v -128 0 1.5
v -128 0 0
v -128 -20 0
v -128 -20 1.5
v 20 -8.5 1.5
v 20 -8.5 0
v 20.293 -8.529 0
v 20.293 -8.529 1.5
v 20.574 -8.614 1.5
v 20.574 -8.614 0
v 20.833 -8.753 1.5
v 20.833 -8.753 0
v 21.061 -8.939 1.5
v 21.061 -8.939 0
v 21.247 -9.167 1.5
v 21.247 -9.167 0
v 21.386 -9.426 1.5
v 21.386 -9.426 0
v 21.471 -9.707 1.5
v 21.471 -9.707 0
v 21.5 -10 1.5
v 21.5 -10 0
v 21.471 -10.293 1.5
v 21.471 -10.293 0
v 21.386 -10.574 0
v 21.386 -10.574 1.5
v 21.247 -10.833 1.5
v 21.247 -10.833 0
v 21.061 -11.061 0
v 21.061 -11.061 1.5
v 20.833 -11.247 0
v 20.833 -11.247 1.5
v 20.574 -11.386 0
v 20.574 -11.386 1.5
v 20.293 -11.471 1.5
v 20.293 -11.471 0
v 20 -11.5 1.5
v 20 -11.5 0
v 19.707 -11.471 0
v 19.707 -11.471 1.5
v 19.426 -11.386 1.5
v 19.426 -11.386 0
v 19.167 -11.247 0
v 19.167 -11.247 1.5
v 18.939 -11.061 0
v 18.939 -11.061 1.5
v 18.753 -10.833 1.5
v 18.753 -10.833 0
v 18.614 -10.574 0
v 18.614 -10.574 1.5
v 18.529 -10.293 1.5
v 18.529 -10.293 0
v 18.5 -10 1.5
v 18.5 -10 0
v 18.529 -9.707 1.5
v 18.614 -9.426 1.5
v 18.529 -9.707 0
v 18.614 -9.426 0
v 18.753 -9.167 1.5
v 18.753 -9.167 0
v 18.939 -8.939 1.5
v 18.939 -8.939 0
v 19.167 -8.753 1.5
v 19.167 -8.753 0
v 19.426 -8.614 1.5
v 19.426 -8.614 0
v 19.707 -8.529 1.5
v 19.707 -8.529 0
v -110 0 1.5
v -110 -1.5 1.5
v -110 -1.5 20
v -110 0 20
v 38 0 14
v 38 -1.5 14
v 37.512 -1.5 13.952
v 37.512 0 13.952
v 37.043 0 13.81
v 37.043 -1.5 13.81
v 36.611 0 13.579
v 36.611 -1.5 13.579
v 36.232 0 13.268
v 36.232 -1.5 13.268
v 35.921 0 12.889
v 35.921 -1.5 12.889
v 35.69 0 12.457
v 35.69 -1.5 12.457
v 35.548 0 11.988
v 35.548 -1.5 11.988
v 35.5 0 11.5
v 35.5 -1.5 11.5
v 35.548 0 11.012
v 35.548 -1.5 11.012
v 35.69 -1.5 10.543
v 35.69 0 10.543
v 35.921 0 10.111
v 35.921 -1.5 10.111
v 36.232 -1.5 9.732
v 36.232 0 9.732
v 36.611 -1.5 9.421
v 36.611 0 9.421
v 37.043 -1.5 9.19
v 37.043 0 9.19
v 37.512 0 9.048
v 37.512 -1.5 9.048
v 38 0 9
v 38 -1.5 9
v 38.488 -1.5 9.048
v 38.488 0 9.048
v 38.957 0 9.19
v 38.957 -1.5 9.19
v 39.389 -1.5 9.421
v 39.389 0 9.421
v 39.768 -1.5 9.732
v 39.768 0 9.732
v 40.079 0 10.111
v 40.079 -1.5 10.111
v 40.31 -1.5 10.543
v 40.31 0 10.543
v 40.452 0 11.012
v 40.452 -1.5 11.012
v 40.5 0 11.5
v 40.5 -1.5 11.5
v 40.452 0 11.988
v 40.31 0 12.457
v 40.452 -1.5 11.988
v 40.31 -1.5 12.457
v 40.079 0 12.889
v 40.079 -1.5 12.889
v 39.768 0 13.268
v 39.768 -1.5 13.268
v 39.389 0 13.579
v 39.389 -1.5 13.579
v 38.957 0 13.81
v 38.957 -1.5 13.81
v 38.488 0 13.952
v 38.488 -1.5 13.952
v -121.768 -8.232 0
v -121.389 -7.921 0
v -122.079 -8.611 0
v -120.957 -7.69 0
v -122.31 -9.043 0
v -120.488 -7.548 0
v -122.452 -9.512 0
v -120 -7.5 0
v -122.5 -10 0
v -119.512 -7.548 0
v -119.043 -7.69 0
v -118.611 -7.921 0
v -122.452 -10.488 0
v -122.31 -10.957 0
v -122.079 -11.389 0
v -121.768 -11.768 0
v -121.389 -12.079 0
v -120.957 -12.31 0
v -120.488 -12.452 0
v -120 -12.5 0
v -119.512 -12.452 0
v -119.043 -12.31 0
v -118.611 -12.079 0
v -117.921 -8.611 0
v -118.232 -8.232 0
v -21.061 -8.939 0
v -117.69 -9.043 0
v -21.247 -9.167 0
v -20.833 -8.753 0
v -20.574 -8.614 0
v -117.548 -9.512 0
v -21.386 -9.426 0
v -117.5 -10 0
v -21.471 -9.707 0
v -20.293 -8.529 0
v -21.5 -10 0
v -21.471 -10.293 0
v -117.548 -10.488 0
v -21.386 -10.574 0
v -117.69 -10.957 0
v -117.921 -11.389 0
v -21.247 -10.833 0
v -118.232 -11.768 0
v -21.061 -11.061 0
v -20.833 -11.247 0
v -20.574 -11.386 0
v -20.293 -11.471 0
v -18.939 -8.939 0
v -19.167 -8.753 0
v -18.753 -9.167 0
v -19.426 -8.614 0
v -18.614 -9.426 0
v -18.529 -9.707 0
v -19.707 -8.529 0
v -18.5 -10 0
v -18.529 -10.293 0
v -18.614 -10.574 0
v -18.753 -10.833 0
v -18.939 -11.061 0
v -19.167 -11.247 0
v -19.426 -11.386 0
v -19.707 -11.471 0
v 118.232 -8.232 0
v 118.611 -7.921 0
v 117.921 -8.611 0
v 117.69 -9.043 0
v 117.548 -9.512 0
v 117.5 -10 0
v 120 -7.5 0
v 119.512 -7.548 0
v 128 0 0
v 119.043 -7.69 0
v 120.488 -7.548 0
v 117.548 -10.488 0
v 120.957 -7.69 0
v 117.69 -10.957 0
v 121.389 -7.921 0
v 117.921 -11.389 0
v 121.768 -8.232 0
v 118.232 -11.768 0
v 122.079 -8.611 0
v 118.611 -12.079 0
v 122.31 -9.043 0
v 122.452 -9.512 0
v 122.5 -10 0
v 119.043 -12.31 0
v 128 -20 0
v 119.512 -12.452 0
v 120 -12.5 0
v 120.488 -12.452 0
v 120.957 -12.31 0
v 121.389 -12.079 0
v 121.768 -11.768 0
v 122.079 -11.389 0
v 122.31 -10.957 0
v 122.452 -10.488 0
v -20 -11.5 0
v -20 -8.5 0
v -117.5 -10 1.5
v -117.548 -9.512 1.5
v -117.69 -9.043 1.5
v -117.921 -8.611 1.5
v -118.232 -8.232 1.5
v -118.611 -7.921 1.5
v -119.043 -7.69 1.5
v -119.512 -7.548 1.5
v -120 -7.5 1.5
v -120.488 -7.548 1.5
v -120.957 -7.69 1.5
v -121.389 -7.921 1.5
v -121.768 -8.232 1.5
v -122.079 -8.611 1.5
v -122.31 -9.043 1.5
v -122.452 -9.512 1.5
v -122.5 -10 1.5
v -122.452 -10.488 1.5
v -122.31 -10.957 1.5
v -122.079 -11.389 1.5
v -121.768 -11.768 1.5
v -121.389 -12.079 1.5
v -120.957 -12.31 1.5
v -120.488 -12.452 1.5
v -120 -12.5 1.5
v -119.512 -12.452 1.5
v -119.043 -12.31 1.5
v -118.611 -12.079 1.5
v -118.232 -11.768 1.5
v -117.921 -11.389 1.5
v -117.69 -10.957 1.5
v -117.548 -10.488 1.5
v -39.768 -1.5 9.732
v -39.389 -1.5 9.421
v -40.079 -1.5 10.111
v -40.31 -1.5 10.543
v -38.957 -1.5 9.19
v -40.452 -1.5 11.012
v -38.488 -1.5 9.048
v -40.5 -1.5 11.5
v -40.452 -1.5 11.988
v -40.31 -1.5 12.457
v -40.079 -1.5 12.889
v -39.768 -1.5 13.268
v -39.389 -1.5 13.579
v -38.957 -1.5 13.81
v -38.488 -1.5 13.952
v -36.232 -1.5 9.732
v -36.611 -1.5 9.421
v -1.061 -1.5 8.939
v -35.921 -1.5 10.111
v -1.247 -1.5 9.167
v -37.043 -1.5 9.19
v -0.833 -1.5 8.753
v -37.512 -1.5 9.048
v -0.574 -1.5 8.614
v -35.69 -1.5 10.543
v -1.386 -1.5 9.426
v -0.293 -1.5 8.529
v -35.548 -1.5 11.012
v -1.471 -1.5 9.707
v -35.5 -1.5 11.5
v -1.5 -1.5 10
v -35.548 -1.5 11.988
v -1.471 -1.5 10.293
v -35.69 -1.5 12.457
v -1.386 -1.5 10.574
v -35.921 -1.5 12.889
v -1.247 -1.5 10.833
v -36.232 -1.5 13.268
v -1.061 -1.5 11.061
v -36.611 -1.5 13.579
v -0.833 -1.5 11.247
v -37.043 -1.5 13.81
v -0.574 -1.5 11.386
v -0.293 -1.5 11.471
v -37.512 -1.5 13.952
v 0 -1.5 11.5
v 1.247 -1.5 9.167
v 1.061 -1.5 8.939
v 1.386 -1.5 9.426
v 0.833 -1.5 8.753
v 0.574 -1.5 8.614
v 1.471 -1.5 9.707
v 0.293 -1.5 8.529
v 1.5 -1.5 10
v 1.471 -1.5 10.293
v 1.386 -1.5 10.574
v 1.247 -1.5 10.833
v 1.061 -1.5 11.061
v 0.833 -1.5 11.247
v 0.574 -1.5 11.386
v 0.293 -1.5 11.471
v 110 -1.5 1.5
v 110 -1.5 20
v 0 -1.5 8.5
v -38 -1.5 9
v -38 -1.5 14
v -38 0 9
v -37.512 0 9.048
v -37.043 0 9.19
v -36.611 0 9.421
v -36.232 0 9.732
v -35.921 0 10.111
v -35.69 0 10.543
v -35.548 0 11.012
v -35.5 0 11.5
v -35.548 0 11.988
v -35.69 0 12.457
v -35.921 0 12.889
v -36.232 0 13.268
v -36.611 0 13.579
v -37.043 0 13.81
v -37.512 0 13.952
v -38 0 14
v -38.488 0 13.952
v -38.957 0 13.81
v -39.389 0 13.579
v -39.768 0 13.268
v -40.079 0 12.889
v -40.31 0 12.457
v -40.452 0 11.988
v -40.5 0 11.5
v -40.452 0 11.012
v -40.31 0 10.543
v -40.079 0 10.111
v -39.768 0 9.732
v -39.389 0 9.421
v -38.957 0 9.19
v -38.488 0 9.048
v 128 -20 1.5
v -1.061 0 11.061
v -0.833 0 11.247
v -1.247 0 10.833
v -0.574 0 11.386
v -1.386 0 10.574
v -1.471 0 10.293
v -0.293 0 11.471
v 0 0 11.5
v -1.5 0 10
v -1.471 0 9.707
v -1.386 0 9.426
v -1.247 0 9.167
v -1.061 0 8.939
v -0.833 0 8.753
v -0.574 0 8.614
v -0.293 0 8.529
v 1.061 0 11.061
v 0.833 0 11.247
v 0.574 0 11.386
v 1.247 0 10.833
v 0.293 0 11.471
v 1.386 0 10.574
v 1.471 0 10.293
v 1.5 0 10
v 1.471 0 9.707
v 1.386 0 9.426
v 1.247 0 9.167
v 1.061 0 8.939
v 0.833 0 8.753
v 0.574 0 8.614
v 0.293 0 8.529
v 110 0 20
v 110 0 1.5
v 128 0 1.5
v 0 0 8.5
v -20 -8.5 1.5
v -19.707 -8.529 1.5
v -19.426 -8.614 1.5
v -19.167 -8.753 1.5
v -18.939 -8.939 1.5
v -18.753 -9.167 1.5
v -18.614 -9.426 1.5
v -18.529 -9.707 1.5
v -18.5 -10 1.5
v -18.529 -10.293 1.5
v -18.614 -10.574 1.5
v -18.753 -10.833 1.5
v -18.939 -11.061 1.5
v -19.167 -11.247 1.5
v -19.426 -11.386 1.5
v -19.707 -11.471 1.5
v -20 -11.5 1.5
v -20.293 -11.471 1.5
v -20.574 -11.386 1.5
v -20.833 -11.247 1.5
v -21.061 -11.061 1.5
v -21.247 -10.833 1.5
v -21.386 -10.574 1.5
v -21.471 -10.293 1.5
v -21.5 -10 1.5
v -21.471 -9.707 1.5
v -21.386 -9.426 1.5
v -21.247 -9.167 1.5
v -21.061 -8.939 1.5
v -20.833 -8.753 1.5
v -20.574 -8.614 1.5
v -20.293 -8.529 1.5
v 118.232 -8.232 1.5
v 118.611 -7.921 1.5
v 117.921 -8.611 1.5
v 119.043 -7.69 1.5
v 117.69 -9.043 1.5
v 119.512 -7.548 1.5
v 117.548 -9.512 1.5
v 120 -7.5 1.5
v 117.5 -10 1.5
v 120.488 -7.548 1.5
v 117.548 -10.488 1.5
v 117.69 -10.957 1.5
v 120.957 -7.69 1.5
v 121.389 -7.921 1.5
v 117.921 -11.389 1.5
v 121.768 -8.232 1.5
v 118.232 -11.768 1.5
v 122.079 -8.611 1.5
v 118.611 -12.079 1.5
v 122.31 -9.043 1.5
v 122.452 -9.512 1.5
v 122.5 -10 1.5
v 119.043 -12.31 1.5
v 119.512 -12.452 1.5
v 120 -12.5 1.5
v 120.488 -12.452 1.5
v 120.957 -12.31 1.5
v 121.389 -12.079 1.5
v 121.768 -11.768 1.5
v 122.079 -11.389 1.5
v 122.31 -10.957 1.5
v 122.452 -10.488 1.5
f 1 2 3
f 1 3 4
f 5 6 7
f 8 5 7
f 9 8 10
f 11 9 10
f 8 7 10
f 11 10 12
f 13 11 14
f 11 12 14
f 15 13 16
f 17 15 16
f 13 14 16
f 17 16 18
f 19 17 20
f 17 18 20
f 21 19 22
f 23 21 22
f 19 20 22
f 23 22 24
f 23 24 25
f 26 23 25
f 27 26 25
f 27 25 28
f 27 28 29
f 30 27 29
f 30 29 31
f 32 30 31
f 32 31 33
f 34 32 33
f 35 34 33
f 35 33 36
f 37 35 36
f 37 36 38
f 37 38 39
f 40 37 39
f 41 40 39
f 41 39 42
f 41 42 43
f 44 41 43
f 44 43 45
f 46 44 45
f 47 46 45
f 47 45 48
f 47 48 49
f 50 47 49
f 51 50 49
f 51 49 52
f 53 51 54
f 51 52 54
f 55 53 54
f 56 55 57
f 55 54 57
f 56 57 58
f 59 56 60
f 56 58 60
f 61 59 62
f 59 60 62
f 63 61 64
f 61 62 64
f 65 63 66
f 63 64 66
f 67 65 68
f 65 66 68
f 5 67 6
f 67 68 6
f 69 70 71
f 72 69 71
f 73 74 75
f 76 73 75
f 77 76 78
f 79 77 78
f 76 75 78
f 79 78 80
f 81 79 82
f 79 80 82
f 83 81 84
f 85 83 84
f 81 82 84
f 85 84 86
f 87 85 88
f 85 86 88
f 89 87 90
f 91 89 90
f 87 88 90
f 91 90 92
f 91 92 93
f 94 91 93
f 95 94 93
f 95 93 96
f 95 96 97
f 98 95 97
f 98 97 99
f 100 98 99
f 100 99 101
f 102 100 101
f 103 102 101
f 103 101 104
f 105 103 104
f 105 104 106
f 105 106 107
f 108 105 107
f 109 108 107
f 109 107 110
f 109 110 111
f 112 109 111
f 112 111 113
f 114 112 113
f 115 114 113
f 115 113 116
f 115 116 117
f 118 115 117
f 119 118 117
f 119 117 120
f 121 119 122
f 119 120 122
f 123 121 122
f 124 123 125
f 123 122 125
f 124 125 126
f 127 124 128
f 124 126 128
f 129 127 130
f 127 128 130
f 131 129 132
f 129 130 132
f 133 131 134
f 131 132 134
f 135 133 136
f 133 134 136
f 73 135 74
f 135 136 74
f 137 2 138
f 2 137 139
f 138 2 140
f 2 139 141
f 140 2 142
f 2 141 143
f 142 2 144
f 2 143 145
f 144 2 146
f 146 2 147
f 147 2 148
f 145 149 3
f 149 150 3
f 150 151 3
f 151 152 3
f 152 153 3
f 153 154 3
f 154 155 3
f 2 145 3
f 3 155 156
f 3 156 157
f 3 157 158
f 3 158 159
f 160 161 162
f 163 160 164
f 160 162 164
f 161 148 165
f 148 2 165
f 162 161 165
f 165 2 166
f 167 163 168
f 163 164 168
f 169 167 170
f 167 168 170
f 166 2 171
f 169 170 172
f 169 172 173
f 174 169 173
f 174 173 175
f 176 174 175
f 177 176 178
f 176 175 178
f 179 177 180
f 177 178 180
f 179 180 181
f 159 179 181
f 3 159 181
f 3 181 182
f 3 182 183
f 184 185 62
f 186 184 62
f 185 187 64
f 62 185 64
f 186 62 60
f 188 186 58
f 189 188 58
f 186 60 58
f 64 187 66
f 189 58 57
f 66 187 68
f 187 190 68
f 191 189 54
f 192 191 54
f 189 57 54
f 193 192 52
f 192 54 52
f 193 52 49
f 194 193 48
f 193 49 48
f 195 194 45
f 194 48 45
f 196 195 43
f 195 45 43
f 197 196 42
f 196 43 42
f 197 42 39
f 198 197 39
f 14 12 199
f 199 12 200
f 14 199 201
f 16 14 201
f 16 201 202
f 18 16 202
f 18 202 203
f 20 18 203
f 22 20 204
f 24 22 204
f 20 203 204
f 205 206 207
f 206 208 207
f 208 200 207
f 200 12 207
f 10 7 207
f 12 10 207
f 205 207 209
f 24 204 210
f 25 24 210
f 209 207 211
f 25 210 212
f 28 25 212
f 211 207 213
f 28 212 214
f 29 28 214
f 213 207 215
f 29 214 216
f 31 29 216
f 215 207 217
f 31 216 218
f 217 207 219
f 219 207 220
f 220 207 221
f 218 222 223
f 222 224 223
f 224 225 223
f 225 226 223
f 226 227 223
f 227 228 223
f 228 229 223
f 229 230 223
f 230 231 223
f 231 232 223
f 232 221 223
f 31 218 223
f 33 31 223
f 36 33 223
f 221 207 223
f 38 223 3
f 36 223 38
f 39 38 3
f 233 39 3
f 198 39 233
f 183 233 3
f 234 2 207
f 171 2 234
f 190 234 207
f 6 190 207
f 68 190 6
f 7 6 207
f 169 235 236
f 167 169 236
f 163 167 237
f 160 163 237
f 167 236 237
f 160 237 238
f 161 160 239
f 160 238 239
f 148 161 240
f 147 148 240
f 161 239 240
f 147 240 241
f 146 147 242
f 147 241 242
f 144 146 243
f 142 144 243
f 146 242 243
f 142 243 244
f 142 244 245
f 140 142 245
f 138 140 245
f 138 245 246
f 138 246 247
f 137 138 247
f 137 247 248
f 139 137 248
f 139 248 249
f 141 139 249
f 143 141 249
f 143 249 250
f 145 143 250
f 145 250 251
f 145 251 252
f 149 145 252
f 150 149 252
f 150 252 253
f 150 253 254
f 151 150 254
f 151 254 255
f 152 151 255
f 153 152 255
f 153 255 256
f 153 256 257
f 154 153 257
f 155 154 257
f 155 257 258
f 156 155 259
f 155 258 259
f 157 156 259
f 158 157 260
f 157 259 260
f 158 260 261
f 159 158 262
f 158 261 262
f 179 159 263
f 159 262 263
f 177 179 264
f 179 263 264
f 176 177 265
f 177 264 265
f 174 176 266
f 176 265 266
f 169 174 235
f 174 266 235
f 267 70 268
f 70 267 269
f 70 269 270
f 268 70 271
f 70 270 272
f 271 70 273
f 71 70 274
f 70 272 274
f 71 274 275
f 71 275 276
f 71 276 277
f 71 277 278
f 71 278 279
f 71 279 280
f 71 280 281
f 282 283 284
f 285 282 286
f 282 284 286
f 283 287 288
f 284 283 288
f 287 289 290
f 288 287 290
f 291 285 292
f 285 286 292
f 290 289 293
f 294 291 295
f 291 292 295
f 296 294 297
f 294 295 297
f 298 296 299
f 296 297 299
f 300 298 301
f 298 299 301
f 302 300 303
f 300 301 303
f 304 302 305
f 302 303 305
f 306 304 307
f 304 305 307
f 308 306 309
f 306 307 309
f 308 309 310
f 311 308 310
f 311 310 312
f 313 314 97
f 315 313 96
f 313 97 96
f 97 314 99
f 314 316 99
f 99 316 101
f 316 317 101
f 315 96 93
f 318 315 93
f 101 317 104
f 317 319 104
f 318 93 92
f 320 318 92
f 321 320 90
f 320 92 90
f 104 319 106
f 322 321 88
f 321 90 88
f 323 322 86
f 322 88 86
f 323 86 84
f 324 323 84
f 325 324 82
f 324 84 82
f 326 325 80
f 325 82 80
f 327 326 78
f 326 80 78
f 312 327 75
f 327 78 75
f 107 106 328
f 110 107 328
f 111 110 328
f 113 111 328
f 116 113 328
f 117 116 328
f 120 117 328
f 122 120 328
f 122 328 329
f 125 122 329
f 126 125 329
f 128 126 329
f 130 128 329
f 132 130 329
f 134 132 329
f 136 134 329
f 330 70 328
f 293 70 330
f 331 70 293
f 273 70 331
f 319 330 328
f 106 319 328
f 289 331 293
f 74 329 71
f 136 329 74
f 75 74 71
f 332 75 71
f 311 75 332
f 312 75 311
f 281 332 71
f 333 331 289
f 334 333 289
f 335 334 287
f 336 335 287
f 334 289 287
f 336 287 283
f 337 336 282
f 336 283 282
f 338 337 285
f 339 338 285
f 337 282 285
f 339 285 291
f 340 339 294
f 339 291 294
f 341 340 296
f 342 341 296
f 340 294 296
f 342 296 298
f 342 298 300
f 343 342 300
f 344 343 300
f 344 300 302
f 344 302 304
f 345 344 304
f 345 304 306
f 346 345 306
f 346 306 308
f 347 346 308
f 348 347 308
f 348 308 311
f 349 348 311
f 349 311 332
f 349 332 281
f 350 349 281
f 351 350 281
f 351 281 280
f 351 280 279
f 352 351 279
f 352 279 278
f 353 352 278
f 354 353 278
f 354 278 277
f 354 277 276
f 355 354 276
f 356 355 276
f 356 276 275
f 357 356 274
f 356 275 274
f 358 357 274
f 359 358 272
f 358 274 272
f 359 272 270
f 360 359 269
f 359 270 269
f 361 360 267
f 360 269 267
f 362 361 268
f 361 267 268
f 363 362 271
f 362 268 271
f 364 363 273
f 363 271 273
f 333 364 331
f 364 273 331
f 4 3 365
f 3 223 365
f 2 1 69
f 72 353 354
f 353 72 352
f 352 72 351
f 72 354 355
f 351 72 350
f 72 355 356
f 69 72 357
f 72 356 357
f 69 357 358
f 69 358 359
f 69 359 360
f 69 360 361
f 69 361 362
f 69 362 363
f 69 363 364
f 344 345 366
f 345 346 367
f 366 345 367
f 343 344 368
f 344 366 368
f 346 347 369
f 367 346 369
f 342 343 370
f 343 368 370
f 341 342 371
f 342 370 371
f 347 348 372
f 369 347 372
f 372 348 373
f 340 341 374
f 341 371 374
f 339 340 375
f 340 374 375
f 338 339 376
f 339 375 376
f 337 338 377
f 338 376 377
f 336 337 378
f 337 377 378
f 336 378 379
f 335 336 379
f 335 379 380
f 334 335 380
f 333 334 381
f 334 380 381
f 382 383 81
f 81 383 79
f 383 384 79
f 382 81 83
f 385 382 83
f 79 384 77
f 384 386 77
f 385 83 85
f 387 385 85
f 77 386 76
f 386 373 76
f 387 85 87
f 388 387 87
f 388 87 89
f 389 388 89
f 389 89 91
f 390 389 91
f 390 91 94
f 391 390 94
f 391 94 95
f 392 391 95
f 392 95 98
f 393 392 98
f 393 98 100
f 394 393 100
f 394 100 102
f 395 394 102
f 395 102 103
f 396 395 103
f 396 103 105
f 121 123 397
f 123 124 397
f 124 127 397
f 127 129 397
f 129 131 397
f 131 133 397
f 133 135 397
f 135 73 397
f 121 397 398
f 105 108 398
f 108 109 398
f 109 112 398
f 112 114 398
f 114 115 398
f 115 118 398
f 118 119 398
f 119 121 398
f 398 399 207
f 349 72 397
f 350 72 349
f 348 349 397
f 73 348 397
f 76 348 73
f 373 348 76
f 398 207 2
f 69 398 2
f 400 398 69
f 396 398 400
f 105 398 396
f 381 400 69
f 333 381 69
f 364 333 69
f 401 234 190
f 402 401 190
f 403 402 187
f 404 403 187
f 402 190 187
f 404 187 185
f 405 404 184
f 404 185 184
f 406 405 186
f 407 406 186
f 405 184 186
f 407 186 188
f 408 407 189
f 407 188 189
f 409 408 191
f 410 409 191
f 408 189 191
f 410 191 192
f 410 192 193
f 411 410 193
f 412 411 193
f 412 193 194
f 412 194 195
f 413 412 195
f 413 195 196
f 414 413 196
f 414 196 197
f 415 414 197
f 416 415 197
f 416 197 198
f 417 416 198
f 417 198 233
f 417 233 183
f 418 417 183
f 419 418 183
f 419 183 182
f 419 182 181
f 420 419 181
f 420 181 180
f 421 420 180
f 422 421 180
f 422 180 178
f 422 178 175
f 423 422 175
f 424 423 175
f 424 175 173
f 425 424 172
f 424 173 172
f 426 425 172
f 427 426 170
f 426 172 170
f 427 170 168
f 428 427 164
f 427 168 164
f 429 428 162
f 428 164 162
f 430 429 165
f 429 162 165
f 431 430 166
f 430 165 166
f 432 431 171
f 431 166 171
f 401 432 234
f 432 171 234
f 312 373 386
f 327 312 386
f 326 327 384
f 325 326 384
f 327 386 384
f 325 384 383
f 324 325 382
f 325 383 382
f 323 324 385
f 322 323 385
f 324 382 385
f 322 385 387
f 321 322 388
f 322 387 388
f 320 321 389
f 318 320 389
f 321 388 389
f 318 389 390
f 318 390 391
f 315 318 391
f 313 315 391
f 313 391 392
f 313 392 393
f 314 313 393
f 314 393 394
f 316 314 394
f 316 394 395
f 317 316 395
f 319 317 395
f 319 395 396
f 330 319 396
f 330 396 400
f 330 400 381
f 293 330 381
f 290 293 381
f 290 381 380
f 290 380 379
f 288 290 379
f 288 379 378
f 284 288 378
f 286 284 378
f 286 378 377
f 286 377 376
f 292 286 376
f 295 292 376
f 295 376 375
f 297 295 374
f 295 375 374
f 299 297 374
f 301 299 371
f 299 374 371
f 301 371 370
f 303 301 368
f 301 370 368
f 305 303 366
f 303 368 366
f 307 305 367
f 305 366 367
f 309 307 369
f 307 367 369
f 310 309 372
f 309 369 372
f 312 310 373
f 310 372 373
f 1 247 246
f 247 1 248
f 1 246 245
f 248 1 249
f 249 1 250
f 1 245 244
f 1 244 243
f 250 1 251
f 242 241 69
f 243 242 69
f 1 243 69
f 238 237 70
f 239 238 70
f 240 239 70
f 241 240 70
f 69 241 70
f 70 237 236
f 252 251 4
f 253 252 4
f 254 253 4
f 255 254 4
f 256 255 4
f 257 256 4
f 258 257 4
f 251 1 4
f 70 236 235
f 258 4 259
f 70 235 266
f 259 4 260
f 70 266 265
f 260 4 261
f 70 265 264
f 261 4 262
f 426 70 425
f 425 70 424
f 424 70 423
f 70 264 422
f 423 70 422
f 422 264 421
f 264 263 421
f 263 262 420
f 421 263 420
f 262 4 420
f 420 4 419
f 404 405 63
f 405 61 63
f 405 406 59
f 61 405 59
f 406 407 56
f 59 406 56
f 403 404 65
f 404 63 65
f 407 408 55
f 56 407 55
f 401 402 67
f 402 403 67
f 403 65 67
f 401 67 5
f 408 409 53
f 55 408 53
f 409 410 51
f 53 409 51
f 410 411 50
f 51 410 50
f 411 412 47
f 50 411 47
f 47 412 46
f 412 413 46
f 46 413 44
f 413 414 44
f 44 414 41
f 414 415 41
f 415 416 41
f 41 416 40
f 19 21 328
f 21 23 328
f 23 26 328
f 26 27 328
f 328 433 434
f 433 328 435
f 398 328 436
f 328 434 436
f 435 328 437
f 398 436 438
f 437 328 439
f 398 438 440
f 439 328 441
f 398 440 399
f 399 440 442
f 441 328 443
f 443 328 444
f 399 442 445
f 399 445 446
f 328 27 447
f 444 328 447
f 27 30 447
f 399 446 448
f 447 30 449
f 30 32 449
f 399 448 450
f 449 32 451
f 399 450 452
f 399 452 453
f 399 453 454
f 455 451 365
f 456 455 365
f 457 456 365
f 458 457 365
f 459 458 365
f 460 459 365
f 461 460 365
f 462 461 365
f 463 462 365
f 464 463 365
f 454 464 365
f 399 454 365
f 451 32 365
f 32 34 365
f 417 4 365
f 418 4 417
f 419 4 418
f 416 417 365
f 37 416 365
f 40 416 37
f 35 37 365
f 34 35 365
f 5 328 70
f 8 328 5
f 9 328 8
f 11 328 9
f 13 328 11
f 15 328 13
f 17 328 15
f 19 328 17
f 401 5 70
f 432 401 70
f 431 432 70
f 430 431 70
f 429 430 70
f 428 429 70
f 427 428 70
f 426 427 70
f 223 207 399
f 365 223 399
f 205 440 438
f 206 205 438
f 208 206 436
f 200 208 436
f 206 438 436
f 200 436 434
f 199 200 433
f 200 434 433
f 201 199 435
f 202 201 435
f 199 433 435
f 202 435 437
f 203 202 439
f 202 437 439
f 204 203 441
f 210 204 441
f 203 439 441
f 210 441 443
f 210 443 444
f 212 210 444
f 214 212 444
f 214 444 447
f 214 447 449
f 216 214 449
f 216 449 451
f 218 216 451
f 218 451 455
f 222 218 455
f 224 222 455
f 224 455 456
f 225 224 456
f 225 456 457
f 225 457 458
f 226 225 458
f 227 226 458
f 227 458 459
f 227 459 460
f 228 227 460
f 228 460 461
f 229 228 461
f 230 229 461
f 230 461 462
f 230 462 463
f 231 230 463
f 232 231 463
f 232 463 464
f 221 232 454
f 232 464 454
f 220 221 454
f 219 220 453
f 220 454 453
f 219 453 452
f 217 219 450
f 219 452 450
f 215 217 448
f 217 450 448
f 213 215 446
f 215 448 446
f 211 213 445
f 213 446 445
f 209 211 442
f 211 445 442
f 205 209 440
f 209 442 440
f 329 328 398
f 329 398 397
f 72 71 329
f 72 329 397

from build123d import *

# Parameters (mm, degrees)
EXTRU_MINCE1_DEPTH      = 128
ESQUISSE2_R             = 2.5
ENL_V_MAT_EXTRU_1_DEPTH = 10
ESQUISSE3_R             = 2.5
ESQUISSE3_W             = 18
ESQUISSE3_H             = 18.5
ENL_V_MAT_EXTRU_2_DEPTH = 10
ESQUISSE4_R             = 1.5
ENL_V_MAT_EXTRU_3_DEPTH = 5
ESQUISSE5_R             = 1.5
ENL_V_MAT_EXTRU_4_DEPTH = 5


with BuildPart() as part:
    # Esquisse1 → Extru.-Mince1 (new, symmetric)
    with BuildSketch(Plane(origin=(0, 0, 0), x_dir=(0, 0, -1), z_dir=(1, 0, 0))):
        Polygon((-20, 0), (0, 0), (0, -20), (-1.5, -20), (-1.5, -1.5), (-20, -1.5), align=None)
    extrude(amount=EXTRU_MINCE1_DEPTH, both=True)

    # Esquisse2 → Enlèv. mat.-Extru.1 (cut)
    with BuildSketch(Plane.XY.offset(1.5)):
        with Locations((-120, -10)):
            Circle(ESQUISSE2_R)
        with Locations(Location((120, -10, 0), (0, 0, 90))):
            Circle(ESQUISSE2_R)
    extrude(amount=-ENL_V_MAT_EXTRU_1_DEPTH, mode=Mode.SUBTRACT)

    # Esquisse3 → Enlèv. mat.-Extru.2 (cut)
    with BuildSketch(Plane.XZ.offset(1.5)):
        with Locations(Location((-38, 11.5, 0), (0, 0, 270))):
            Circle(ESQUISSE3_R)
        with Locations(Location((38, 11.5, 0), (0, 0, 90))):
            Circle(ESQUISSE3_R)
        with Locations((-119, 10.75)):
            Rectangle(ESQUISSE3_W, ESQUISSE3_H)
        with Locations((119, 10.75)):
            Rectangle(ESQUISSE3_W, ESQUISSE3_H)
    extrude(amount=-ENL_V_MAT_EXTRU_2_DEPTH, mode=Mode.SUBTRACT)

    # Esquisse4 → Enlèv. mat.-Extru.3 (cut)
    with BuildSketch(Plane(origin=(0, 0, 0), x_dir=(1, 0, 0), z_dir=(0, 1, 0))):
        with Locations(Location((0, -10, 0), (0, 0, 270))):
            Circle(ESQUISSE4_R)
    extrude(amount=-ENL_V_MAT_EXTRU_3_DEPTH, mode=Mode.SUBTRACT)

    # Esquisse5 → Enlèv. mat.-Extru.4 (cut)
    with BuildSketch(Plane(origin=(0, 0, 0), x_dir=(-1, 0, 0), z_dir=(0, 0, -1))):
        with Locations(Location((-20, -10, 0), (0, 0, 90))):
            Circle(ESQUISSE5_R)
        with Locations(Location((20, -10, 0), (0, 0, 90))):
            Circle(ESQUISSE5_R)
    extrude(amount=-ENL_V_MAT_EXTRU_4_DEPTH, mode=Mode.SUBTRACT)


solid = part.part
